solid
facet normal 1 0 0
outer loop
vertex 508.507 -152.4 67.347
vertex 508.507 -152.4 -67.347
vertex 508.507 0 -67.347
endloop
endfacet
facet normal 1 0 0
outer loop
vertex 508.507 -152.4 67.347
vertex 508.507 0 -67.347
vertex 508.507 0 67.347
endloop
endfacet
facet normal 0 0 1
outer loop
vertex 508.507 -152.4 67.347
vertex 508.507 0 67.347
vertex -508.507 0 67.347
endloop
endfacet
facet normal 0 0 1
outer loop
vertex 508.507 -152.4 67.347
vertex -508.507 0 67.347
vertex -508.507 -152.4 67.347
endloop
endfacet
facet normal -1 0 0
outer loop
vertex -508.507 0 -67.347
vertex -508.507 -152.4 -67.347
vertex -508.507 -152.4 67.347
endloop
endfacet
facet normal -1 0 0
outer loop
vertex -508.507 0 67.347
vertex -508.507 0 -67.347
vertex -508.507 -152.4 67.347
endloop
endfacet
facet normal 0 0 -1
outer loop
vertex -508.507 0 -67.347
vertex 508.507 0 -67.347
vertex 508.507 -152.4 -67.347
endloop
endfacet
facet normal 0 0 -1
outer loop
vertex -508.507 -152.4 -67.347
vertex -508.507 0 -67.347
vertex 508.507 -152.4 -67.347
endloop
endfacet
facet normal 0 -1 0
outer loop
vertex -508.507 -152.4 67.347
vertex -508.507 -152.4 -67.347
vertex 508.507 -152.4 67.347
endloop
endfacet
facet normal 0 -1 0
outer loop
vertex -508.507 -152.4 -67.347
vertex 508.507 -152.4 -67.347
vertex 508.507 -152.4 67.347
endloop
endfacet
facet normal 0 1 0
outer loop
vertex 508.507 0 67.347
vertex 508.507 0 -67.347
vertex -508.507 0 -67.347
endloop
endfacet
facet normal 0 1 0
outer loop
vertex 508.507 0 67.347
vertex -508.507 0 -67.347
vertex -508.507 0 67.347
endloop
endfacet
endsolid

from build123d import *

# Parameters (mm, degrees)
F0_W     = 255.0143003464
F0_H     = 134.6930116415
F1_DEPTH = 152.4
F2_DEPTH = 381
F3_DEPTH = 381


with BuildPart() as f1:
    # F0 (on Front) → F1 (new body)
    with BuildSketch(Plane.XZ):
        Rectangle(F0_W, F0_H)
    extrude(amount=F1_DEPTH)

    # F2 (add): a face of the model
    f2_faces = [f1.faces().sort_by_distance(p)[0] for p in [
        (127.5071501732, -76.2, 0),
    ]]
    extrude(f2_faces, amount=F2_DEPTH)

    # F3 (add): a face of the model
    f3_faces = [f1.faces().sort_by_distance(p)[0] for p in [
        (-127.5071501732, -76.2, 0),
    ]]
    extrude(f3_faces, amount=F3_DEPTH)


solid = f1.part
